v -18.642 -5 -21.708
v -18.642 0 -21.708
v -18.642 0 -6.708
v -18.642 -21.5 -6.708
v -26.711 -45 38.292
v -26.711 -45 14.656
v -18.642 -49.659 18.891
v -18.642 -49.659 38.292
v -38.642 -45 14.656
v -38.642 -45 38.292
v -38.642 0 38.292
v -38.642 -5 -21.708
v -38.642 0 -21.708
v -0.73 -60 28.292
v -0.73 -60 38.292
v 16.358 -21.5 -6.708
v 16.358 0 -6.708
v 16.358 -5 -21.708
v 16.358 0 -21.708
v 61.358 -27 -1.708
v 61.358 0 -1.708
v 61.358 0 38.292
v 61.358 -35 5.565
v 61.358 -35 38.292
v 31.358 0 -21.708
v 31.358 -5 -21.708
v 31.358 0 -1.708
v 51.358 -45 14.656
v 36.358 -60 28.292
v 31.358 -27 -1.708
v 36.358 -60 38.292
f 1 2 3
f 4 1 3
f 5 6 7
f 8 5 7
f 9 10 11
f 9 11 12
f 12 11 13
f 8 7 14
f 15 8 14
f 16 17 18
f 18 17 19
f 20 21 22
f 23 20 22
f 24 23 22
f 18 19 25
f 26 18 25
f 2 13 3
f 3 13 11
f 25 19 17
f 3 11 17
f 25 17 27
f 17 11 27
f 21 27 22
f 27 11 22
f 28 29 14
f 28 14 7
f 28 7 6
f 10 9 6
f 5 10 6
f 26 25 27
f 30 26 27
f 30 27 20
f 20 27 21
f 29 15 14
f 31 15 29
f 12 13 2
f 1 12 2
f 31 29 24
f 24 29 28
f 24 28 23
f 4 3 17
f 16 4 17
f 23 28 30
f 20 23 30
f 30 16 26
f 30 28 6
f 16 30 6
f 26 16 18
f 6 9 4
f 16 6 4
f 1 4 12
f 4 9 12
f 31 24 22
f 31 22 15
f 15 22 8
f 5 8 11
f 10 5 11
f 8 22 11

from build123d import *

# Parameters (mm, degrees)
F3_DEPTH = 60
F5_DEPTH = 60.001
F7_DEPTH = 100.001


with BuildPart() as f3:
    # F2 (on Front) → F3 (new body)
    with BuildSketch(Plane.XZ):
        Polygon((61.358089, 38.292337), (-38.641911, 38.292337), (-38.641911, -21.707663), (-18.641911, -21.707663), (-18.641911, -6.707663), (16.358089, -6.707663), (16.358089, -21.707663), (31.358089, -21.707663), (31.358089, -1.707663), (61.358089, -1.707663), align=None)
    extrude(amount=F3_DEPTH)

    # F4 (on face) → F5 (cut, through all)
    with BuildSketch(Plane(origin=(0, 0, -21.707663), x_dir=(1, 0, 0), z_dir=(0, 0, -1))):
        Polygon((-38.641911, 60), (-38.641911, 45), (-26.710982, 45), (-18.641911, 49.65868), (-18.641911, 60), align=None)
        Polygon((-18.641911, 60), (-18.641911, 49.65868), (-0.730219, 60), align=None)
        Polygon((61.358089, 60), (36.358089, 60), (61.358089, 35), align=None)
    extrude(amount=-F5_DEPTH, mode=Mode.SUBTRACT)

    # F6 (on face) → F7 (cut, through all)
    with BuildSketch(Plane(origin=(-38.641911, 0, 0), x_dir=(0, -1, 0), z_dir=(-1, 0, 0))):
        Polygon((60, -21.707663), (60, 28.292337), (45, 14.655973), (45, -21.707663), align=None)
        Polygon((45, -21.707663), (45, 14.655973), (5, -21.707663), align=None)
    extrude(amount=-F7_DEPTH, mode=Mode.SUBTRACT)


solid = f3.part
